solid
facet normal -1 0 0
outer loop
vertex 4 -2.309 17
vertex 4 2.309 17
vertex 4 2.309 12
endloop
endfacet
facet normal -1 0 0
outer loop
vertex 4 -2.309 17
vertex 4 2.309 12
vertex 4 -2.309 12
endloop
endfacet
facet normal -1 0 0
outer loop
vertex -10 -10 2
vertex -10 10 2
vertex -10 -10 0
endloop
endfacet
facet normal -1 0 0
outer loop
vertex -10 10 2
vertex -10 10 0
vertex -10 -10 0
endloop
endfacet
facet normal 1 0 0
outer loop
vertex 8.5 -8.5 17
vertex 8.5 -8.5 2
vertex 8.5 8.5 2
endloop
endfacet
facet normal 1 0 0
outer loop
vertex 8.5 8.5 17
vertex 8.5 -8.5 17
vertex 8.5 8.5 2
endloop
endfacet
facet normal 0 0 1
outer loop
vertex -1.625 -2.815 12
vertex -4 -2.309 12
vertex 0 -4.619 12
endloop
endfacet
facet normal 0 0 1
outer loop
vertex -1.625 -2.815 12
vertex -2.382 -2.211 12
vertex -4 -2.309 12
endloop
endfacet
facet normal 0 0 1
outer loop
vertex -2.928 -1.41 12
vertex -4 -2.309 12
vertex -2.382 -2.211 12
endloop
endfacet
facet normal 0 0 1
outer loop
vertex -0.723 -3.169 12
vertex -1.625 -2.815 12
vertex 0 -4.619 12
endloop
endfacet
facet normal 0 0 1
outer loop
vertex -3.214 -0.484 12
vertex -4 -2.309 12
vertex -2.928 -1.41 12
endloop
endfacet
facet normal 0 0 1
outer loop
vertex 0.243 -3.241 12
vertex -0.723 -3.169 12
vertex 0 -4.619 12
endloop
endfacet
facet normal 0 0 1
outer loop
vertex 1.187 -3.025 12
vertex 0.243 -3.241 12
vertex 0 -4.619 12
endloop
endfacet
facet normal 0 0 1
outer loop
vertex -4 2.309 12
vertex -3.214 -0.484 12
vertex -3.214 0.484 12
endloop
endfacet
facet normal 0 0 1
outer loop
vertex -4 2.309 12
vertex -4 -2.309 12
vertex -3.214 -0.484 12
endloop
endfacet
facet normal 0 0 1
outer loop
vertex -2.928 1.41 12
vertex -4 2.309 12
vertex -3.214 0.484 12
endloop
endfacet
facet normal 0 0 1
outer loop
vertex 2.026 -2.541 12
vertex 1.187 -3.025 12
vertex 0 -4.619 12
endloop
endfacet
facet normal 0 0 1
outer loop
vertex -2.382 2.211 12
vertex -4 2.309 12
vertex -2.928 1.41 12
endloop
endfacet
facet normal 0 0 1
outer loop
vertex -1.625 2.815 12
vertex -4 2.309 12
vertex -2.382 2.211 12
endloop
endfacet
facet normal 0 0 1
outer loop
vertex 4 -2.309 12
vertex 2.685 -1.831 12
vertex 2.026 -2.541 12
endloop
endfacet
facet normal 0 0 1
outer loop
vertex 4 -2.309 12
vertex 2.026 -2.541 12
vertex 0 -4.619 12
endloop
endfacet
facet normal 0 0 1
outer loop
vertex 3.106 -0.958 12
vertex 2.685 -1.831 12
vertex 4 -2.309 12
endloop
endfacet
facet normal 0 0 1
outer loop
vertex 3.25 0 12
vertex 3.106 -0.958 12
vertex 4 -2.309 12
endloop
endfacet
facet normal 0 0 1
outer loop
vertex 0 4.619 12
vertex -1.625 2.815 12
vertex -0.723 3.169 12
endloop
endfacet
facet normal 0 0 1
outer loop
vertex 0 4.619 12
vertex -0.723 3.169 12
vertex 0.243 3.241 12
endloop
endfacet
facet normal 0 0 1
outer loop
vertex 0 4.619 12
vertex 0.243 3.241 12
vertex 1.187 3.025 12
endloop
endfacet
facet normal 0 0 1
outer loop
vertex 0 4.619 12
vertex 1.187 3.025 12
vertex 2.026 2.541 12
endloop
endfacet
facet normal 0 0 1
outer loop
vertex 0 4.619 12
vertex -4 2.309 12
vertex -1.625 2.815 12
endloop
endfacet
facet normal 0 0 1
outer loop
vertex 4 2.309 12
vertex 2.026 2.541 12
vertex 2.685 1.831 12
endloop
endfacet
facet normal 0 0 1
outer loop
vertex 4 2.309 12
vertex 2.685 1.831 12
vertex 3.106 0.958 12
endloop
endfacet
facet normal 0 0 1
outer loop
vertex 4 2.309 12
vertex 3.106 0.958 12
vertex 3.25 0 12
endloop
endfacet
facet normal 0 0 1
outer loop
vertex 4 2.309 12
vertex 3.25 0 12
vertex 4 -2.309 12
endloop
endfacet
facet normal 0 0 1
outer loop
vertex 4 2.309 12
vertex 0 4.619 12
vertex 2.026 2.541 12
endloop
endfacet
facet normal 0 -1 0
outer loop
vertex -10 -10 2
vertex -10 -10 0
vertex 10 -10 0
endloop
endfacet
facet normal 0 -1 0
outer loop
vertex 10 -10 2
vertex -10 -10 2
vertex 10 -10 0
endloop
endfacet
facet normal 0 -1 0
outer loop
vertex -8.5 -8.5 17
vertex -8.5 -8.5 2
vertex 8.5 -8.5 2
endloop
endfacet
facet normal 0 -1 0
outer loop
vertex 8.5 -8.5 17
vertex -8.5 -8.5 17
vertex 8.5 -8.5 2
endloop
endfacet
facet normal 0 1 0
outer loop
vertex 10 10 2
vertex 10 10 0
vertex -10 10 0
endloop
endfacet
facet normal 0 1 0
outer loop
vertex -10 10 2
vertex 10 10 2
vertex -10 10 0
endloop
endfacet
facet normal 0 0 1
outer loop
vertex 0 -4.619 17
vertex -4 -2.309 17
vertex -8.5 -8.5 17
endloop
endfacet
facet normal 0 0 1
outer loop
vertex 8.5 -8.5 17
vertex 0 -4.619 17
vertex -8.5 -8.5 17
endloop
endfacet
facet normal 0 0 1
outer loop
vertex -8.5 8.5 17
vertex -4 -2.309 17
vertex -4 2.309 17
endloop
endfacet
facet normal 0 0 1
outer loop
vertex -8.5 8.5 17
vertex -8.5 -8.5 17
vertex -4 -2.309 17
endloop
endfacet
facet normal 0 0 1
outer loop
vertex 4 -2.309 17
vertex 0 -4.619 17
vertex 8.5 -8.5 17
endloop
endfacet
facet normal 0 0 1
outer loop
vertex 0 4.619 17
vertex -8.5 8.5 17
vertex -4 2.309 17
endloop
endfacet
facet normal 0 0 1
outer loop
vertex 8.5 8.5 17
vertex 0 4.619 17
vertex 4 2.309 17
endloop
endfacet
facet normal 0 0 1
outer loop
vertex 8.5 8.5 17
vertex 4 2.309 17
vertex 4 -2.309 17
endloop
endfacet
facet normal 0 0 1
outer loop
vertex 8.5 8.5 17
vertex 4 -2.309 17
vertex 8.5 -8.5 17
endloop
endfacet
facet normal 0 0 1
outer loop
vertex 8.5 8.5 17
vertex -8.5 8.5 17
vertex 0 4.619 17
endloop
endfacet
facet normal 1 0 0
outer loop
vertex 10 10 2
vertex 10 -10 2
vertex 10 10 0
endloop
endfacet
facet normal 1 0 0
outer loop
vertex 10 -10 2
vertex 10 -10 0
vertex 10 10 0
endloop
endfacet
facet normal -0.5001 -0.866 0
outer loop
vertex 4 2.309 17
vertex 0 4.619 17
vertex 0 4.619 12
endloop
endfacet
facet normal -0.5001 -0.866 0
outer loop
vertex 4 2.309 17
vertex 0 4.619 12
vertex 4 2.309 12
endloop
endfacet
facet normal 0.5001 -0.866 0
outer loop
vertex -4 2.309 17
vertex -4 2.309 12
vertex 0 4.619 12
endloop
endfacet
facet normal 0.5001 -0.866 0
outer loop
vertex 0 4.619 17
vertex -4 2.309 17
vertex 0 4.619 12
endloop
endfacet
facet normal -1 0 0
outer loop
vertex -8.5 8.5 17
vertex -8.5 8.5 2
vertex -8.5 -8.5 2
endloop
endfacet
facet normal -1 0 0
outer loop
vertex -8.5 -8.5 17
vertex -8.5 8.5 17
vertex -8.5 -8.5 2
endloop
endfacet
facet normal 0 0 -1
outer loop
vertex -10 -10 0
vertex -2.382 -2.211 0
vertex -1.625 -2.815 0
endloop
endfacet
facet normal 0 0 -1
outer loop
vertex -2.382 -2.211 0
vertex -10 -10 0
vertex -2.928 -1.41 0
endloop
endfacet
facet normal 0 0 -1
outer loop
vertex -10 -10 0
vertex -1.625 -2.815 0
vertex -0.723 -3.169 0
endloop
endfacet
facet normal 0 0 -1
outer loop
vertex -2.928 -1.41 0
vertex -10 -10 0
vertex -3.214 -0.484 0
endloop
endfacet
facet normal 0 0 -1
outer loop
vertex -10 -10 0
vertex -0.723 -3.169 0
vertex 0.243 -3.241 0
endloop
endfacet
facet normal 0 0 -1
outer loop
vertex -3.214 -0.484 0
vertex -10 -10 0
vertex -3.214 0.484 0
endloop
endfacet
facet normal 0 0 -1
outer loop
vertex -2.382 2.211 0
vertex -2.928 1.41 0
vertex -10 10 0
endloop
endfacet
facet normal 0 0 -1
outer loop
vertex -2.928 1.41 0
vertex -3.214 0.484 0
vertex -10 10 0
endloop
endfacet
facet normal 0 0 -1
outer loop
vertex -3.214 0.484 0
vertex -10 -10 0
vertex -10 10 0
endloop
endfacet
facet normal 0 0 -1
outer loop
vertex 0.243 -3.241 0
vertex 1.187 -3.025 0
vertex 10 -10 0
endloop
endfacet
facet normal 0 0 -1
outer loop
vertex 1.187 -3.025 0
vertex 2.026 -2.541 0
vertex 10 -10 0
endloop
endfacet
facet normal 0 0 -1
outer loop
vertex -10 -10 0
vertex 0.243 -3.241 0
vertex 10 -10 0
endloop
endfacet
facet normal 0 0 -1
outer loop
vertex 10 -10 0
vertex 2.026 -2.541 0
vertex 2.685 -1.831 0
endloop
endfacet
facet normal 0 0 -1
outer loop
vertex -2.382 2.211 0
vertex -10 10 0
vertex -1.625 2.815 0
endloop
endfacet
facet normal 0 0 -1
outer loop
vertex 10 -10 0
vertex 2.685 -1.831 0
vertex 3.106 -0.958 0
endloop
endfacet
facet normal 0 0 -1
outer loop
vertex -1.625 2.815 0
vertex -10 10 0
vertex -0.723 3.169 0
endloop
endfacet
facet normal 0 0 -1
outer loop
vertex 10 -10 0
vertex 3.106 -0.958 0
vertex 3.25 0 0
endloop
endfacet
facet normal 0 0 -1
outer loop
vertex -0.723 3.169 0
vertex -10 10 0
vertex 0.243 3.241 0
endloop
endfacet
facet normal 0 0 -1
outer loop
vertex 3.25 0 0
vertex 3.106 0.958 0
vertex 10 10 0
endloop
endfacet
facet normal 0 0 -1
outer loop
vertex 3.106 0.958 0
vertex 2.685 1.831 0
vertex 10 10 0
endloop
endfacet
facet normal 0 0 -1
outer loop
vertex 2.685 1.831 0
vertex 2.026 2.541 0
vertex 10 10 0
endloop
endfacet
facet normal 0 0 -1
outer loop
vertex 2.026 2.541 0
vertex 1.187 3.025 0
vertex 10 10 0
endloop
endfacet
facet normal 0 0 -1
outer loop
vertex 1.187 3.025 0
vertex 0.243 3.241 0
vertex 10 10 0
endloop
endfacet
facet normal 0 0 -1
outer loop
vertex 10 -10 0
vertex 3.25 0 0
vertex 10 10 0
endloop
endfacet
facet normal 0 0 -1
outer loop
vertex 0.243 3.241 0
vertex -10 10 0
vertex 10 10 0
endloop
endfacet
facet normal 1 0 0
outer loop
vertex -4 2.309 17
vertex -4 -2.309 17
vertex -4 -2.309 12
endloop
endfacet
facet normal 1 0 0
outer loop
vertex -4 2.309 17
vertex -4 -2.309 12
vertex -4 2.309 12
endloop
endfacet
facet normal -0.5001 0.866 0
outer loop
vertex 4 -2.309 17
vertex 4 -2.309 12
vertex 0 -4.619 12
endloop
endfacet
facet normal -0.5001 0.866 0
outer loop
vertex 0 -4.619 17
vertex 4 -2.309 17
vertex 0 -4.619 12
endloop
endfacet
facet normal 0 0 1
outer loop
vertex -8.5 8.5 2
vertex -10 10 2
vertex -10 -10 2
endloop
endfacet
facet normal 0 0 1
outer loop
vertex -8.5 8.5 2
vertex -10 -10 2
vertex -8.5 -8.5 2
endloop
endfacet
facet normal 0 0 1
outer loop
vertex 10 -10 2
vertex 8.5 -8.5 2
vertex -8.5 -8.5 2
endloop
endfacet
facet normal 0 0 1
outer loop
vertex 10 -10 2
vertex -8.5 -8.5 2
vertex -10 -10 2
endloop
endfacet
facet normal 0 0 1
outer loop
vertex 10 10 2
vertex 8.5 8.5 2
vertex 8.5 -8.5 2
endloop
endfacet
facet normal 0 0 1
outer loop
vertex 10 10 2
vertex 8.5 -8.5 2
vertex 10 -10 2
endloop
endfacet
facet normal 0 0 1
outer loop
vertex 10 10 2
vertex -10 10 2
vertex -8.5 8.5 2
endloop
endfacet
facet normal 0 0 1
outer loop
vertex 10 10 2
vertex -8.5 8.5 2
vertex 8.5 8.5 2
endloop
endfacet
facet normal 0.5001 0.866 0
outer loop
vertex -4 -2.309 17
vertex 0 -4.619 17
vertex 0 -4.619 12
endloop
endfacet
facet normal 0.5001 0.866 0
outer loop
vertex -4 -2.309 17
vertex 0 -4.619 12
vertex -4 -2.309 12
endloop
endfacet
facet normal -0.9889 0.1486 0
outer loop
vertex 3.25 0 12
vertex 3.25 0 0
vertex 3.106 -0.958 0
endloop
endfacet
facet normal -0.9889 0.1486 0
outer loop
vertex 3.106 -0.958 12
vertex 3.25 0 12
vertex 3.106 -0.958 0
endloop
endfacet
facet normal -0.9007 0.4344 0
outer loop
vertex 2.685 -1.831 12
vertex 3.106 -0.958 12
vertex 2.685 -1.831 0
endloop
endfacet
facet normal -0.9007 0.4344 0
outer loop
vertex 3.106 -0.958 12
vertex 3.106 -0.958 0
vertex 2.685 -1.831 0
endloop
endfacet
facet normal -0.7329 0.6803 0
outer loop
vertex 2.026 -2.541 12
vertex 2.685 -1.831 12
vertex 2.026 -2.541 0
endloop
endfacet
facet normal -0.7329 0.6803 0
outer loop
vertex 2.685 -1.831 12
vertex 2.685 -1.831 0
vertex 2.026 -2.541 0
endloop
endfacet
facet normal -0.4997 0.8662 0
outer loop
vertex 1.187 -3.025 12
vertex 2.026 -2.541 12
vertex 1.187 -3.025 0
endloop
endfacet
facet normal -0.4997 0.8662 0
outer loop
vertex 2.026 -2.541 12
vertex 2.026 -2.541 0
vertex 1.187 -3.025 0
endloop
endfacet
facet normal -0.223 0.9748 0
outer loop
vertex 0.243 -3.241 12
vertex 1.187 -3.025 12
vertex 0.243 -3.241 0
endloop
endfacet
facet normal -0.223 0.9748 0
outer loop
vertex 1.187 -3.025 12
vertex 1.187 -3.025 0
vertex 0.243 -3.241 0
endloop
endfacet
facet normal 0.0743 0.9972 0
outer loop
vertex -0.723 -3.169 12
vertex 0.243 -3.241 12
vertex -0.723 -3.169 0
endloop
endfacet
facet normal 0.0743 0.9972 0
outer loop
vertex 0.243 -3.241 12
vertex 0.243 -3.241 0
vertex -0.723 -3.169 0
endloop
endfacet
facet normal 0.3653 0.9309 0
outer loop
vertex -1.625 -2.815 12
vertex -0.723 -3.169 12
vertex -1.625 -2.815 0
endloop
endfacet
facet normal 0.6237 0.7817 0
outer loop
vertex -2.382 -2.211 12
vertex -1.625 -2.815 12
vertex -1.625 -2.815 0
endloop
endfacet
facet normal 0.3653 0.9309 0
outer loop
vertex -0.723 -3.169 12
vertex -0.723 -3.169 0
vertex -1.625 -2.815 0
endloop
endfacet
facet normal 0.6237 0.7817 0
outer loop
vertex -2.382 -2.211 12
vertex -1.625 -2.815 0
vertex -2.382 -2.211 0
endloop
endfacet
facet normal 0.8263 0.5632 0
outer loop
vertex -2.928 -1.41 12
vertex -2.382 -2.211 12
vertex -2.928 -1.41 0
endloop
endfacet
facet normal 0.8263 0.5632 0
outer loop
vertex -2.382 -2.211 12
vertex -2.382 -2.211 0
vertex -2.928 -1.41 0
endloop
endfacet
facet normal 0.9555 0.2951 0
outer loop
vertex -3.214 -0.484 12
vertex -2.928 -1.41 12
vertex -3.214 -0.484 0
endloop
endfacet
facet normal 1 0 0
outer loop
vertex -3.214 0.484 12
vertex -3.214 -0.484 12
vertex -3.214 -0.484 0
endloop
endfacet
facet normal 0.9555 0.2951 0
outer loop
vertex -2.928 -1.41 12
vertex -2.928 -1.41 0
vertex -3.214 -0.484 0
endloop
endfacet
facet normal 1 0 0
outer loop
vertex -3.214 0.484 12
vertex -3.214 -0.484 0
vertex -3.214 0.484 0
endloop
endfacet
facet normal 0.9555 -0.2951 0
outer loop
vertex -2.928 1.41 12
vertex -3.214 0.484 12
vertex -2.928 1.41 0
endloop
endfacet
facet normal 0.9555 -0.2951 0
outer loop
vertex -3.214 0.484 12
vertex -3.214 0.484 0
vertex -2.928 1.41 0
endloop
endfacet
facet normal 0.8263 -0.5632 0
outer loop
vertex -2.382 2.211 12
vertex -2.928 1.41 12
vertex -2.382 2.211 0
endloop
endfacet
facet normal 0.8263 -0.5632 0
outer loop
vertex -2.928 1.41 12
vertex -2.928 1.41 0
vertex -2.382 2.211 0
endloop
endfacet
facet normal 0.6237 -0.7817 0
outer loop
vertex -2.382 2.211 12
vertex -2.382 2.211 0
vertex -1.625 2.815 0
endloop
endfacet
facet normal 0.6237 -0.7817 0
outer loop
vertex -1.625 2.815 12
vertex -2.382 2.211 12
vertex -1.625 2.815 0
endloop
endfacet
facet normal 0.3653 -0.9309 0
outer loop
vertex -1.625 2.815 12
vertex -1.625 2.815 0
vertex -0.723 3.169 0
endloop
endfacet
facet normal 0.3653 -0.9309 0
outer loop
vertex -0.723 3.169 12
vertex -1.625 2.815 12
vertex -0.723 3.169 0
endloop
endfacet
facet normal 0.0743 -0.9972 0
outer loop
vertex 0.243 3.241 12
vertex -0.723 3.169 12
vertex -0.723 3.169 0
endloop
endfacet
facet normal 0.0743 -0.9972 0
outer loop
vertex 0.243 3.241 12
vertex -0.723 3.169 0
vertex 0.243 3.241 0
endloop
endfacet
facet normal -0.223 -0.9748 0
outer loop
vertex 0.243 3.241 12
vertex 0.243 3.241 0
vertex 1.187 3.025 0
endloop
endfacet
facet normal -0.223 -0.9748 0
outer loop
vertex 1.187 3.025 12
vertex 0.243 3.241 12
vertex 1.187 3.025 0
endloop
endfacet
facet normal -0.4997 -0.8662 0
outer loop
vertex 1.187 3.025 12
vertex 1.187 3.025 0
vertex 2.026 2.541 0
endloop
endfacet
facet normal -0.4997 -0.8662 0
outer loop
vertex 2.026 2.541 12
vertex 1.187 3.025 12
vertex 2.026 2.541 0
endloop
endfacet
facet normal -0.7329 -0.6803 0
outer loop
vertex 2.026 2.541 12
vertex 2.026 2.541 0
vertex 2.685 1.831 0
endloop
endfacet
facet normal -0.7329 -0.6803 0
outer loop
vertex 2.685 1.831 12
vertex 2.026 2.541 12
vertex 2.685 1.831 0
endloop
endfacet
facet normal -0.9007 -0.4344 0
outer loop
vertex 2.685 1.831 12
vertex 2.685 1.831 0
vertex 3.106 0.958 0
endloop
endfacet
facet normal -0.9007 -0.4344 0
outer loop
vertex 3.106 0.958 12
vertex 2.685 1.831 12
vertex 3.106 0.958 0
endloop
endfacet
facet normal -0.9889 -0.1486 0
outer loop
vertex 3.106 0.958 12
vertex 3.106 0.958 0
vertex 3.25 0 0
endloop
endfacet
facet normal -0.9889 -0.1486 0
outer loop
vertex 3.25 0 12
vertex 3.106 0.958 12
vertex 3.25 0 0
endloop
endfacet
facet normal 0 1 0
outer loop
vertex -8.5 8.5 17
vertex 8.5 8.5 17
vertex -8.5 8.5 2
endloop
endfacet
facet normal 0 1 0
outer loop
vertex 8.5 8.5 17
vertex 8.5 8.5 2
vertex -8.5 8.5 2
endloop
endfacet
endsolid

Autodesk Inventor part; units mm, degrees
ref_plane "YZ Plane" through (0, 0, 0) normal (1, 0, 0) x (0, 1, 0)
ref_plane "XZ Plane" through (0, 0, 0) normal (0, 1, 0) x (-1, 0, 0)
ref_plane "XY Plane" through (0, 0, 0) normal (0, 0, 1) x (1, 0, 0)
sketch "Skizze1" plane through (0, 0, 0) normal (0, 0, 1) x (1, 0, 0)
  circle A0 centre (0, 0) radius 3.25
  line L0 (-10, -10) -> (10, -10)
  line L1 (10, -10) -> (10, 10)
  line L2 (10, 10) -> (-10, 10)
  line L3 (-10, 10) -> (-10, -10)
  line L4 (-10, -10) -> (10, 10) construction
  line L5 (10, -10) -> (-10, 10) construction
  dimension "d0" = 6.5
  dimension "d1" = 20
extrude "Extrusion1" add sketch "Skizze1" along normal blind 2
sketch "Skizze2" plane through (0, 0, 2) normal (0, 0, 1) x (1, 0, 0)
  line L0 (-8.5, -8.5) -> (8.5, -8.5)
  line L1 (8.5, -8.5) -> (8.5, 8.5)
  line L2 (8.5, 8.5) -> (-8.5, 8.5)
  line L3 (-8.5, 8.5) -> (-8.5, -8.5)
  line L4 (-8.5, -8.5) -> (8.5, 8.5) construction
  line L5 (8.5, -8.5) -> (-8.5, 8.5) construction
  circle A0 centre (0, 0) radius 3.25 projected
  dimension "d4" = 17
extrude "Extrusion2" add sketch "Skizze2" along normal blind 15
sketch "Skizze3" plane through (0, 0, 17) normal (0, 0, 1) x (1, 0, 0)
  line L0 (0, 4.6188) -> (4, 2.3094)
  line L1 (4, 2.3094) -> (4, -2.3094)
  line L2 (4, -2.3094) -> (0, -4.6188)
  line L3 (0, -4.6188) -> (-4, -2.3094)
  line L4 (-4, -2.3094) -> (-4, 2.3094)
  line L5 (-4, 2.3094) -> (0, 4.6188)
  point P0 (0, 0)
  point P1 (0, 0)
  dimension "d7" = 8
extrude "Extrusion3" cut sketch "Skizze3" against normal blind 5
properties part number "AlutubeMount"
